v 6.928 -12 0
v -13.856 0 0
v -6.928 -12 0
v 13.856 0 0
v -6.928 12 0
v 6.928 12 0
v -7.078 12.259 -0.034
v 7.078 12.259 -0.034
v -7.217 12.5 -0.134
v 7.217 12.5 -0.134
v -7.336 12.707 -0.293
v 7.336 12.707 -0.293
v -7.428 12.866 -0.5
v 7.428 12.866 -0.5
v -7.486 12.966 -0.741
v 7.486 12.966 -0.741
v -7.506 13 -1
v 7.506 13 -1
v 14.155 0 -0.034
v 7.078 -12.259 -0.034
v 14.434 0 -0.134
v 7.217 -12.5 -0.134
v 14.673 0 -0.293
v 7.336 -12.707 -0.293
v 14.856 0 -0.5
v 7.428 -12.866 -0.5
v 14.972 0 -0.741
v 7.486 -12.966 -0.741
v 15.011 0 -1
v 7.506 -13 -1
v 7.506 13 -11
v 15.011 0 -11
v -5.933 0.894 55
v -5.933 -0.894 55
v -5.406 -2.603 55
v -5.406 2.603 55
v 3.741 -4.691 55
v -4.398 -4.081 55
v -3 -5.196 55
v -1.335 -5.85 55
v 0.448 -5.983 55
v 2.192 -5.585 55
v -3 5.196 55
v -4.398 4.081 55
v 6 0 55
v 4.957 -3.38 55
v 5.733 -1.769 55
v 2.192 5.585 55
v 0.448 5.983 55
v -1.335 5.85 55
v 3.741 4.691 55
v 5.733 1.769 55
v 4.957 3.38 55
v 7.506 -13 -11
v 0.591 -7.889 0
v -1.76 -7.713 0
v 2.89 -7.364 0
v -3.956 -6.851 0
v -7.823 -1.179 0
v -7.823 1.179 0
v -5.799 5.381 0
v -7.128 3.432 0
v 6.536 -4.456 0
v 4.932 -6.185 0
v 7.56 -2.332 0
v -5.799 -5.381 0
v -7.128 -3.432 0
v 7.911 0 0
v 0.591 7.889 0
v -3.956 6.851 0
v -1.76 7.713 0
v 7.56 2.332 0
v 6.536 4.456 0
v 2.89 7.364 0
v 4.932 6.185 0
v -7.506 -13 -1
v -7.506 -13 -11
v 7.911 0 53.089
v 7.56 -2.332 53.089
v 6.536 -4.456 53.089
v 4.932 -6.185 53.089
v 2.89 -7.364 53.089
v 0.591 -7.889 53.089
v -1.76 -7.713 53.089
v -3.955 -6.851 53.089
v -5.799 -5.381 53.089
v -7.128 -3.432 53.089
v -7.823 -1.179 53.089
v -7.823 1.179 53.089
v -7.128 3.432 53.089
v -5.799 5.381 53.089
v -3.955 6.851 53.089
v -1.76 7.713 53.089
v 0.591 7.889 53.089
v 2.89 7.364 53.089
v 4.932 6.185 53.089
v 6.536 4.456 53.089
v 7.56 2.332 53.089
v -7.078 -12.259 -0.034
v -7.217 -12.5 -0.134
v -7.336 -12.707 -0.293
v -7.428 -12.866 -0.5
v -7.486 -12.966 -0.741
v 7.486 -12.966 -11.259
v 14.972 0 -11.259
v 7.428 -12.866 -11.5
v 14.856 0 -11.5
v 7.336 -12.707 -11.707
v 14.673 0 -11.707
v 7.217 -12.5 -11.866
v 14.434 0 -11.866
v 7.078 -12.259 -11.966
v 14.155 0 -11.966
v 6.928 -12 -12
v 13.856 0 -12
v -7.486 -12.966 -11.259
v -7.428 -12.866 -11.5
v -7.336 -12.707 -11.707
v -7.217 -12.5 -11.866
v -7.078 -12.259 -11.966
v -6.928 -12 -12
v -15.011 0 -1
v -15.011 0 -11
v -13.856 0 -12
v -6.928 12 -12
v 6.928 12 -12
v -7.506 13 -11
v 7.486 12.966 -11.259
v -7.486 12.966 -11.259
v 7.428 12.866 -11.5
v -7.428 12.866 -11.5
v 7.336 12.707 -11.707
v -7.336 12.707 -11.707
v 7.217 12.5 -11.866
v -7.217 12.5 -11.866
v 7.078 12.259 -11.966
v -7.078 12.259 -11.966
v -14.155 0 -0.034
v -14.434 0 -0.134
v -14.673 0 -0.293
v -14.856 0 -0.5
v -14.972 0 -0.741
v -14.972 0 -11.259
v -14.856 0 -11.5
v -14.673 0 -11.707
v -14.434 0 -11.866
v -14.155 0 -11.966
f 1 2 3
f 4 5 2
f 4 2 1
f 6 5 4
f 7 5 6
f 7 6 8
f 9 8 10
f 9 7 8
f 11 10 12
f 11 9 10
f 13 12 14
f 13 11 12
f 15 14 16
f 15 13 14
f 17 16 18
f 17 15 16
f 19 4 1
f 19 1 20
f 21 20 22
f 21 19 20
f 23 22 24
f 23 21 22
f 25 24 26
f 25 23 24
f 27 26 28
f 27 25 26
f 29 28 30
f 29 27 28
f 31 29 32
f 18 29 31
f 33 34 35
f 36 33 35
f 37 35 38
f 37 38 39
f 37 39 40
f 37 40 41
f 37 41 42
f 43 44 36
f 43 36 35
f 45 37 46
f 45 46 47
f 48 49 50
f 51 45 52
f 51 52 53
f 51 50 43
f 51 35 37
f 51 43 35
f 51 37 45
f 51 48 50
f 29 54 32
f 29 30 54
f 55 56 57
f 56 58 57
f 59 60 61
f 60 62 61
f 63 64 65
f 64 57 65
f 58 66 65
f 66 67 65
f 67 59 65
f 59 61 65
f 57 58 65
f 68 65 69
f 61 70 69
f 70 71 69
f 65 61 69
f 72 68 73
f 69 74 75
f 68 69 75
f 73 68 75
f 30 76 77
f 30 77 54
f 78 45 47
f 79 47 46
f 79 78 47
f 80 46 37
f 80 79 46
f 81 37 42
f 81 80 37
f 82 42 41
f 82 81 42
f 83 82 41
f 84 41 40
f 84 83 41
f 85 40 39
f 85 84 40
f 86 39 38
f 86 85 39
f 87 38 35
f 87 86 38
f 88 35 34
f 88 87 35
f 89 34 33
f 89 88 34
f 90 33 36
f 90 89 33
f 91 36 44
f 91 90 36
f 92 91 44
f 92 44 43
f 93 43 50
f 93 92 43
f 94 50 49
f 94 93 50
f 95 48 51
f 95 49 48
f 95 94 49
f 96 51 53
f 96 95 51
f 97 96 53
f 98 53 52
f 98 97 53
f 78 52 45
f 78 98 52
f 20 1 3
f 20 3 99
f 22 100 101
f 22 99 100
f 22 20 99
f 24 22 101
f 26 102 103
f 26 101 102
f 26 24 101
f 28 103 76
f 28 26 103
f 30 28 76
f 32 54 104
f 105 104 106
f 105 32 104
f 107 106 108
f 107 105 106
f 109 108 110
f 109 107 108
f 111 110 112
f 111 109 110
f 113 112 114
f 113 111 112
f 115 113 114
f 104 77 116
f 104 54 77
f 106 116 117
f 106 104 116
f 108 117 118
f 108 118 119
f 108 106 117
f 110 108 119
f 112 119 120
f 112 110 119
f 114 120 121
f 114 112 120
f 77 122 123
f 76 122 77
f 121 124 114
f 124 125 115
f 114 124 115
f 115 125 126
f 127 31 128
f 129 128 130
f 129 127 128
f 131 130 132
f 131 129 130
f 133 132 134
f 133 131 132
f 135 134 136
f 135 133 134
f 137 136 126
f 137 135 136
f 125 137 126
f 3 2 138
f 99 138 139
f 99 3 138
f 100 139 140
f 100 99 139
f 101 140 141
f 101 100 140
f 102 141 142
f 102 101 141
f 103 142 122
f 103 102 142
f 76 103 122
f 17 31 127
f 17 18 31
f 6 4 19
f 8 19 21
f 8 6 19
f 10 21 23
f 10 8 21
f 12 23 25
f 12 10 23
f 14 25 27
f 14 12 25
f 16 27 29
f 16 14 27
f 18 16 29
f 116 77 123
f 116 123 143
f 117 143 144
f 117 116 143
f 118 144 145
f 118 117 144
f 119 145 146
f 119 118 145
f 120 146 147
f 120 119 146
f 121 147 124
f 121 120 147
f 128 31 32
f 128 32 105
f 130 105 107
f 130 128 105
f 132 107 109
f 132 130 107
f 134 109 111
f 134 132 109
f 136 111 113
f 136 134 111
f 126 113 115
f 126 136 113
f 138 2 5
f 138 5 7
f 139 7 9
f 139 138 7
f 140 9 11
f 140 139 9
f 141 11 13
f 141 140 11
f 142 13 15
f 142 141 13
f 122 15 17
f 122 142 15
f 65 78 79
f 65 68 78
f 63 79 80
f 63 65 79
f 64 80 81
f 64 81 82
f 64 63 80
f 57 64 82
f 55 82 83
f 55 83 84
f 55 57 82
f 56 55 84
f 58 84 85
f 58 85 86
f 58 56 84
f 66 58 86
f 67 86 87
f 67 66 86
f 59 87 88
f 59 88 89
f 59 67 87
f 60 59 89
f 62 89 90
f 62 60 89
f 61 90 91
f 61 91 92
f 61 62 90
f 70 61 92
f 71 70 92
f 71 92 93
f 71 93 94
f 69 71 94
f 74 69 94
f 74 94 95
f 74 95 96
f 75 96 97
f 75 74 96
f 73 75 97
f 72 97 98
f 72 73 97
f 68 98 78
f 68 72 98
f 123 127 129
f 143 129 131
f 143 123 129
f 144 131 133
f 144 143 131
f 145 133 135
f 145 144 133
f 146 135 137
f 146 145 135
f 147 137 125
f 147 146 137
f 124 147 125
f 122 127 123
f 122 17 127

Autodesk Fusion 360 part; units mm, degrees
sketch "Sketch1" plane through (0, 0, 0) normal (0, 0, 1) x (1, 0, 0)
  circle A0 centre (0, 0) radius 8
  line L0 (0, 0) -> (0, 8) construction
  line L1 (0, 0) -> (-8, 0) construction
  line L2 (0, 0) -> (8, 0) construction
  line L3 (0, 0) -> (0, -8) construction
  line L4 (-4.6188, 8) -> (-9.2376, 0) construction
  line L5 (-9.2376, 0) -> (-4.6188, -8) construction
  line L6 (-4.6188, -8) -> (4.6188, -8) construction
  line L7 (4.6188, -8) -> (9.2376, 0) construction
  line L8 (9.2376, 0) -> (4.6188, 8) construction
  line L9 (4.6188, 8) -> (-4.6188, 8) construction
  line L10 (-7.5056, -13) -> (7.5056, -13)
  line L11 (7.5056, -13) -> (15.0111, 0)
  line L12 (15.0111, 0) -> (7.5056, 13)
  line L13 (7.5056, 13) -> (-7.5056, 13)
  line L14 (-7.5056, 13) -> (-15.0111, 0)
  line L15 (-15.0111, 0) -> (-7.5056, -13)
  dimension "d1" = 16
  dimension "d4" = 5
extrude "Extrude1" add sketch "Sketch1" along normal blind 55 contours A0 makes body 1
extrude "Extrude2" add sketch "Sketch1" against normal blind 12 separate body contours A0 | L10 L11 L12 L13 L14 L15 makes body 2
chamfer "Chamfer1" distance 2 angle 45 1 edges at (-7.4586, -2.8929, 55) on bodies 1
fillet "Fillet1" radius 1 12 edges at (0, 13, 0) (11.2583, 6.5, 0) (0, 13, -12) (11.2583, 6.5, -12) (11.2583, -6.5, 0) (11.2583, -6.5, -12) (0, -13, 0) (0, -13, -12) (-11.2583, -6.5, 0) (-11.2583, -6.5, -12) (-11.2583, 6.5, 0) (-11.2583, 6.5, -12) on bodies 2
thread "Thread1" "ISO Metric profile 16.0 M16x2 6g" major diameter 15.822 minor diameter 13.534 pitch 2 angle 60 resizes the face on face at (7.9901, -0.3988, 35.3333) on bodies 1
